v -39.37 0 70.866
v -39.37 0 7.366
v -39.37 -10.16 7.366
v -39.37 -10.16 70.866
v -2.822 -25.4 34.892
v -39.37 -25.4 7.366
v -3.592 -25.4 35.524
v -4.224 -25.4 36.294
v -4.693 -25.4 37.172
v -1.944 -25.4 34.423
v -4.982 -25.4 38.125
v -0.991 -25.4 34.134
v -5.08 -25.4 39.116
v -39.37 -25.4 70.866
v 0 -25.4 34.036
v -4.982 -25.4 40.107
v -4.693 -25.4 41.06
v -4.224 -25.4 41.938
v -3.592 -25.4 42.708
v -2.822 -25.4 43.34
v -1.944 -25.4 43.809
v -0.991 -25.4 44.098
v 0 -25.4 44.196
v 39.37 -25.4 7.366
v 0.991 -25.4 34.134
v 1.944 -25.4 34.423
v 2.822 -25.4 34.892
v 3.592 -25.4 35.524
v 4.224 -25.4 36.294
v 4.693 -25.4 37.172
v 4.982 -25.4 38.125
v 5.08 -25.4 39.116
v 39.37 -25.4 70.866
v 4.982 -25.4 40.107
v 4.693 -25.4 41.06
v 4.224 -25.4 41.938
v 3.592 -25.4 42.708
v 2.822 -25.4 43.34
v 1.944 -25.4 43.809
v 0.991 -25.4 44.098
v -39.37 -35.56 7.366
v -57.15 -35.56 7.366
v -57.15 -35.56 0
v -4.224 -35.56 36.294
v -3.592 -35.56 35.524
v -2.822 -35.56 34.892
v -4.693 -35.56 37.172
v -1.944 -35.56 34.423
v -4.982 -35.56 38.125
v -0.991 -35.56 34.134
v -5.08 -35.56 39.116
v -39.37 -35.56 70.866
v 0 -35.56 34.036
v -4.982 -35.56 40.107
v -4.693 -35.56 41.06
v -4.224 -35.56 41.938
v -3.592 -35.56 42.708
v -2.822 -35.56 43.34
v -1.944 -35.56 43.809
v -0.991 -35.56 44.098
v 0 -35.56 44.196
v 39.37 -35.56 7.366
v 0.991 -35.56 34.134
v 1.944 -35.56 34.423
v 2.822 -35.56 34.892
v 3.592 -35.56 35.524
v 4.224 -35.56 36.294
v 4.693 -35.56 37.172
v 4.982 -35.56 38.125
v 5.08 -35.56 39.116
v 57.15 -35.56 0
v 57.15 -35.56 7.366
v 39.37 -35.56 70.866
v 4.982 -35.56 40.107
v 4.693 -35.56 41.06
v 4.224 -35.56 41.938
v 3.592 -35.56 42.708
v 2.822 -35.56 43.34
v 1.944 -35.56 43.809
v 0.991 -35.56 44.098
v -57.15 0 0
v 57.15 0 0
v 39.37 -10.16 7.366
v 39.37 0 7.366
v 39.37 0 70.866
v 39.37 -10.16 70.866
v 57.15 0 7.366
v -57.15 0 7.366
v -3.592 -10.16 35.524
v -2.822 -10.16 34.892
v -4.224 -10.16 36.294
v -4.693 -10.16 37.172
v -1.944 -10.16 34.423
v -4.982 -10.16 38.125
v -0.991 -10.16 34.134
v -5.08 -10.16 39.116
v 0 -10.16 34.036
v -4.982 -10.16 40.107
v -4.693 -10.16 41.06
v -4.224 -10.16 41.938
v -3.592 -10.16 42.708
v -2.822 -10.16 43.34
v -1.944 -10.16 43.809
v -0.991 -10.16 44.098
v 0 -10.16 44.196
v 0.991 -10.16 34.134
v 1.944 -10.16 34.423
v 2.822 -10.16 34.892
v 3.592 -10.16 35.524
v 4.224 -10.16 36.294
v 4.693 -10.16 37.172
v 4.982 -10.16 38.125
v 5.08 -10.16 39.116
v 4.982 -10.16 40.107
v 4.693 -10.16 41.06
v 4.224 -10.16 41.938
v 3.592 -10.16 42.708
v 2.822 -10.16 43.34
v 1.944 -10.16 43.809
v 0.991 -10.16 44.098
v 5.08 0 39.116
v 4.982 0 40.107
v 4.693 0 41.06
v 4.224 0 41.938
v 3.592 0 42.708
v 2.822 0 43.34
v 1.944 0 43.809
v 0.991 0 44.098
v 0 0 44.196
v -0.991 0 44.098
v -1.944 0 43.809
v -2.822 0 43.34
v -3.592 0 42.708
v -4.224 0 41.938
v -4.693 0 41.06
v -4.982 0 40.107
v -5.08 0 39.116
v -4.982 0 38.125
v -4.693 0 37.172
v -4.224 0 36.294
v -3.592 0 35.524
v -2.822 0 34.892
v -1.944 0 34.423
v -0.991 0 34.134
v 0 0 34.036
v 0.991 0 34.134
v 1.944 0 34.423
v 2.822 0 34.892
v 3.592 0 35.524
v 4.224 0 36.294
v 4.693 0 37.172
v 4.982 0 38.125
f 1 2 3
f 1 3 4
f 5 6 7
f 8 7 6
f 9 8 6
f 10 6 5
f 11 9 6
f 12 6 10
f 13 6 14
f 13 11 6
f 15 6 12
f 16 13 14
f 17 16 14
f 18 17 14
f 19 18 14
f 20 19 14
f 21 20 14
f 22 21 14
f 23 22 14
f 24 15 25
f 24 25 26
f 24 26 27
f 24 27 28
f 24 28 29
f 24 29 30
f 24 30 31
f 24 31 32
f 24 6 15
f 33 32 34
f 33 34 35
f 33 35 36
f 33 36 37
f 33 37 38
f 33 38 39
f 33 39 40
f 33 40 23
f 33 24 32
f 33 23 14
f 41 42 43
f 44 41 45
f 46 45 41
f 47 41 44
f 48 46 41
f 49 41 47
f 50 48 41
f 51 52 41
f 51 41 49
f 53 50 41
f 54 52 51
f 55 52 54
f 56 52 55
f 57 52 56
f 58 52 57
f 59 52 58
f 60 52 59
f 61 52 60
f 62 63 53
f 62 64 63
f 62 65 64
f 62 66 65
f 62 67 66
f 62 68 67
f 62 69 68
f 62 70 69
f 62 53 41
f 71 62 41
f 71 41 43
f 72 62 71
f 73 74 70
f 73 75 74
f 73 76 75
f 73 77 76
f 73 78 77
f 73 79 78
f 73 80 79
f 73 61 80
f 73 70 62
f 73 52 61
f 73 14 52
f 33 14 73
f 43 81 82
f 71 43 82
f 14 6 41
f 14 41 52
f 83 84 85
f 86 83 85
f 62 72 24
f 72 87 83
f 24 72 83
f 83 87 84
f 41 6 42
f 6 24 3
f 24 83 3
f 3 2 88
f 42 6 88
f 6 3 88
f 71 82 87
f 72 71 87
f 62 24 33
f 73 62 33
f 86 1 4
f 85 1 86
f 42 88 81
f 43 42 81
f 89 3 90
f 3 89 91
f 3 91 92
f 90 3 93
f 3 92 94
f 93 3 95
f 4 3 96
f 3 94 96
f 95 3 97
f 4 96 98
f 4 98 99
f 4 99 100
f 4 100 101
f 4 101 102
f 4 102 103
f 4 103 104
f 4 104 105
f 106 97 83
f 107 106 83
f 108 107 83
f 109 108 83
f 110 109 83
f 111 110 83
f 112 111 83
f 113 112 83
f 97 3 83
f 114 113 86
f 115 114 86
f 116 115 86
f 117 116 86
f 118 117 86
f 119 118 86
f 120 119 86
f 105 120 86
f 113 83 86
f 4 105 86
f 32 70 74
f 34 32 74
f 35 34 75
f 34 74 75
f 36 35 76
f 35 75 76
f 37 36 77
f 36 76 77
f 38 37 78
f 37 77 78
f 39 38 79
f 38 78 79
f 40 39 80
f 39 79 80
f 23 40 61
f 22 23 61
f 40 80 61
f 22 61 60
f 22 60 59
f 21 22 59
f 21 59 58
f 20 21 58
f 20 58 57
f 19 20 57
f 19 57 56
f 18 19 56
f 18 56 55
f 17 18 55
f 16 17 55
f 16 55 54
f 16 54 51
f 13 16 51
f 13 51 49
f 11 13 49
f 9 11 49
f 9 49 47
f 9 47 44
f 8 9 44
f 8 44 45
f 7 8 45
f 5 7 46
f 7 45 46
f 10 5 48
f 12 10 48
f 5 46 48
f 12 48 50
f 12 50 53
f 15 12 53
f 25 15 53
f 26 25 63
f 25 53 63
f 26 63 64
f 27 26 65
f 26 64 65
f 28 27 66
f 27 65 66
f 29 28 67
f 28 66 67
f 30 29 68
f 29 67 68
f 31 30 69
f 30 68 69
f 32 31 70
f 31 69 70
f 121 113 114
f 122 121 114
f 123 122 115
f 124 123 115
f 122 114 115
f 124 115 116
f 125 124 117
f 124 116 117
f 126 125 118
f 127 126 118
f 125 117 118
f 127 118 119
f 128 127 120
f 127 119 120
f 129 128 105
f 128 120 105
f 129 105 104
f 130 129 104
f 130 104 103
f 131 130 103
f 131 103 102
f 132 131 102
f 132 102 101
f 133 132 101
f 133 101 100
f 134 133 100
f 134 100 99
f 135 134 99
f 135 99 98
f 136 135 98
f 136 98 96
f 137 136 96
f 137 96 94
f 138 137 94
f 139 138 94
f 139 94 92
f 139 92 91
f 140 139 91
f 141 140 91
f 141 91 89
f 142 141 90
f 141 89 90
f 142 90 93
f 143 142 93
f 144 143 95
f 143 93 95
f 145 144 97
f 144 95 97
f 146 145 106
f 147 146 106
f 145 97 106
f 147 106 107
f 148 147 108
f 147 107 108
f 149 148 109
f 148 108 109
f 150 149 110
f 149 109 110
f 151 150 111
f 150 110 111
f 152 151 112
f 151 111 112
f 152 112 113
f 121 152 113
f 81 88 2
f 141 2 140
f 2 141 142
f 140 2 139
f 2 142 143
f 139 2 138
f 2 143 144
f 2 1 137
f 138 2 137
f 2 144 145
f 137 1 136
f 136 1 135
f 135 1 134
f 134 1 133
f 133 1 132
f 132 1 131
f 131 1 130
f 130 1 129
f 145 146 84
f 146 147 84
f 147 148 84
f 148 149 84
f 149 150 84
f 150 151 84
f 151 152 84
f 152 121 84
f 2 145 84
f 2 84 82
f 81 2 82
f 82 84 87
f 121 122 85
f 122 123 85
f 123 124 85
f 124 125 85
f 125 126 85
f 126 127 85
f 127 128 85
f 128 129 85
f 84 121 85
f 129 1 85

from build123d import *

# Parameters (mm, degrees)
F0_W     = 78.74
F0_H     = 63.5
F1_DEPTH = 35.56
F2_W     = 15.24
F2_H     = 63.5
F3_DEPTH = 127
F4_R     = 5.08
F5_DEPTH = 76.2


with BuildPart() as f1:
    # F0 (on Front) → F1 (new body)
    with BuildSketch(Plane.XZ):
        Polygon((-57.15, 7.366), (-57.15, 0), (57.15, 0), (57.15, 7.366), (39.37, 7.366), (-39.37, 7.366), align=None)
        with Locations((0, 39.116)):
            Rectangle(F0_W, F0_H)
    extrude(amount=F1_DEPTH)

    # F2 (on face) → F3 (cut)
    with BuildSketch(Plane.YZ.offset(39.37)):
        with Locations((-17.78, 39.116)):
            Rectangle(F2_W, F2_H)
    extrude(amount=-F3_DEPTH, mode=Mode.SUBTRACT)

    # F4 (on face) → F5 (cut)
    with BuildSketch(Plane.XZ.offset(35.56)):
        with Locations((0, 39.116)):
            Circle(F4_R)
    extrude(amount=-F5_DEPTH, mode=Mode.SUBTRACT)


solid = f1.part
